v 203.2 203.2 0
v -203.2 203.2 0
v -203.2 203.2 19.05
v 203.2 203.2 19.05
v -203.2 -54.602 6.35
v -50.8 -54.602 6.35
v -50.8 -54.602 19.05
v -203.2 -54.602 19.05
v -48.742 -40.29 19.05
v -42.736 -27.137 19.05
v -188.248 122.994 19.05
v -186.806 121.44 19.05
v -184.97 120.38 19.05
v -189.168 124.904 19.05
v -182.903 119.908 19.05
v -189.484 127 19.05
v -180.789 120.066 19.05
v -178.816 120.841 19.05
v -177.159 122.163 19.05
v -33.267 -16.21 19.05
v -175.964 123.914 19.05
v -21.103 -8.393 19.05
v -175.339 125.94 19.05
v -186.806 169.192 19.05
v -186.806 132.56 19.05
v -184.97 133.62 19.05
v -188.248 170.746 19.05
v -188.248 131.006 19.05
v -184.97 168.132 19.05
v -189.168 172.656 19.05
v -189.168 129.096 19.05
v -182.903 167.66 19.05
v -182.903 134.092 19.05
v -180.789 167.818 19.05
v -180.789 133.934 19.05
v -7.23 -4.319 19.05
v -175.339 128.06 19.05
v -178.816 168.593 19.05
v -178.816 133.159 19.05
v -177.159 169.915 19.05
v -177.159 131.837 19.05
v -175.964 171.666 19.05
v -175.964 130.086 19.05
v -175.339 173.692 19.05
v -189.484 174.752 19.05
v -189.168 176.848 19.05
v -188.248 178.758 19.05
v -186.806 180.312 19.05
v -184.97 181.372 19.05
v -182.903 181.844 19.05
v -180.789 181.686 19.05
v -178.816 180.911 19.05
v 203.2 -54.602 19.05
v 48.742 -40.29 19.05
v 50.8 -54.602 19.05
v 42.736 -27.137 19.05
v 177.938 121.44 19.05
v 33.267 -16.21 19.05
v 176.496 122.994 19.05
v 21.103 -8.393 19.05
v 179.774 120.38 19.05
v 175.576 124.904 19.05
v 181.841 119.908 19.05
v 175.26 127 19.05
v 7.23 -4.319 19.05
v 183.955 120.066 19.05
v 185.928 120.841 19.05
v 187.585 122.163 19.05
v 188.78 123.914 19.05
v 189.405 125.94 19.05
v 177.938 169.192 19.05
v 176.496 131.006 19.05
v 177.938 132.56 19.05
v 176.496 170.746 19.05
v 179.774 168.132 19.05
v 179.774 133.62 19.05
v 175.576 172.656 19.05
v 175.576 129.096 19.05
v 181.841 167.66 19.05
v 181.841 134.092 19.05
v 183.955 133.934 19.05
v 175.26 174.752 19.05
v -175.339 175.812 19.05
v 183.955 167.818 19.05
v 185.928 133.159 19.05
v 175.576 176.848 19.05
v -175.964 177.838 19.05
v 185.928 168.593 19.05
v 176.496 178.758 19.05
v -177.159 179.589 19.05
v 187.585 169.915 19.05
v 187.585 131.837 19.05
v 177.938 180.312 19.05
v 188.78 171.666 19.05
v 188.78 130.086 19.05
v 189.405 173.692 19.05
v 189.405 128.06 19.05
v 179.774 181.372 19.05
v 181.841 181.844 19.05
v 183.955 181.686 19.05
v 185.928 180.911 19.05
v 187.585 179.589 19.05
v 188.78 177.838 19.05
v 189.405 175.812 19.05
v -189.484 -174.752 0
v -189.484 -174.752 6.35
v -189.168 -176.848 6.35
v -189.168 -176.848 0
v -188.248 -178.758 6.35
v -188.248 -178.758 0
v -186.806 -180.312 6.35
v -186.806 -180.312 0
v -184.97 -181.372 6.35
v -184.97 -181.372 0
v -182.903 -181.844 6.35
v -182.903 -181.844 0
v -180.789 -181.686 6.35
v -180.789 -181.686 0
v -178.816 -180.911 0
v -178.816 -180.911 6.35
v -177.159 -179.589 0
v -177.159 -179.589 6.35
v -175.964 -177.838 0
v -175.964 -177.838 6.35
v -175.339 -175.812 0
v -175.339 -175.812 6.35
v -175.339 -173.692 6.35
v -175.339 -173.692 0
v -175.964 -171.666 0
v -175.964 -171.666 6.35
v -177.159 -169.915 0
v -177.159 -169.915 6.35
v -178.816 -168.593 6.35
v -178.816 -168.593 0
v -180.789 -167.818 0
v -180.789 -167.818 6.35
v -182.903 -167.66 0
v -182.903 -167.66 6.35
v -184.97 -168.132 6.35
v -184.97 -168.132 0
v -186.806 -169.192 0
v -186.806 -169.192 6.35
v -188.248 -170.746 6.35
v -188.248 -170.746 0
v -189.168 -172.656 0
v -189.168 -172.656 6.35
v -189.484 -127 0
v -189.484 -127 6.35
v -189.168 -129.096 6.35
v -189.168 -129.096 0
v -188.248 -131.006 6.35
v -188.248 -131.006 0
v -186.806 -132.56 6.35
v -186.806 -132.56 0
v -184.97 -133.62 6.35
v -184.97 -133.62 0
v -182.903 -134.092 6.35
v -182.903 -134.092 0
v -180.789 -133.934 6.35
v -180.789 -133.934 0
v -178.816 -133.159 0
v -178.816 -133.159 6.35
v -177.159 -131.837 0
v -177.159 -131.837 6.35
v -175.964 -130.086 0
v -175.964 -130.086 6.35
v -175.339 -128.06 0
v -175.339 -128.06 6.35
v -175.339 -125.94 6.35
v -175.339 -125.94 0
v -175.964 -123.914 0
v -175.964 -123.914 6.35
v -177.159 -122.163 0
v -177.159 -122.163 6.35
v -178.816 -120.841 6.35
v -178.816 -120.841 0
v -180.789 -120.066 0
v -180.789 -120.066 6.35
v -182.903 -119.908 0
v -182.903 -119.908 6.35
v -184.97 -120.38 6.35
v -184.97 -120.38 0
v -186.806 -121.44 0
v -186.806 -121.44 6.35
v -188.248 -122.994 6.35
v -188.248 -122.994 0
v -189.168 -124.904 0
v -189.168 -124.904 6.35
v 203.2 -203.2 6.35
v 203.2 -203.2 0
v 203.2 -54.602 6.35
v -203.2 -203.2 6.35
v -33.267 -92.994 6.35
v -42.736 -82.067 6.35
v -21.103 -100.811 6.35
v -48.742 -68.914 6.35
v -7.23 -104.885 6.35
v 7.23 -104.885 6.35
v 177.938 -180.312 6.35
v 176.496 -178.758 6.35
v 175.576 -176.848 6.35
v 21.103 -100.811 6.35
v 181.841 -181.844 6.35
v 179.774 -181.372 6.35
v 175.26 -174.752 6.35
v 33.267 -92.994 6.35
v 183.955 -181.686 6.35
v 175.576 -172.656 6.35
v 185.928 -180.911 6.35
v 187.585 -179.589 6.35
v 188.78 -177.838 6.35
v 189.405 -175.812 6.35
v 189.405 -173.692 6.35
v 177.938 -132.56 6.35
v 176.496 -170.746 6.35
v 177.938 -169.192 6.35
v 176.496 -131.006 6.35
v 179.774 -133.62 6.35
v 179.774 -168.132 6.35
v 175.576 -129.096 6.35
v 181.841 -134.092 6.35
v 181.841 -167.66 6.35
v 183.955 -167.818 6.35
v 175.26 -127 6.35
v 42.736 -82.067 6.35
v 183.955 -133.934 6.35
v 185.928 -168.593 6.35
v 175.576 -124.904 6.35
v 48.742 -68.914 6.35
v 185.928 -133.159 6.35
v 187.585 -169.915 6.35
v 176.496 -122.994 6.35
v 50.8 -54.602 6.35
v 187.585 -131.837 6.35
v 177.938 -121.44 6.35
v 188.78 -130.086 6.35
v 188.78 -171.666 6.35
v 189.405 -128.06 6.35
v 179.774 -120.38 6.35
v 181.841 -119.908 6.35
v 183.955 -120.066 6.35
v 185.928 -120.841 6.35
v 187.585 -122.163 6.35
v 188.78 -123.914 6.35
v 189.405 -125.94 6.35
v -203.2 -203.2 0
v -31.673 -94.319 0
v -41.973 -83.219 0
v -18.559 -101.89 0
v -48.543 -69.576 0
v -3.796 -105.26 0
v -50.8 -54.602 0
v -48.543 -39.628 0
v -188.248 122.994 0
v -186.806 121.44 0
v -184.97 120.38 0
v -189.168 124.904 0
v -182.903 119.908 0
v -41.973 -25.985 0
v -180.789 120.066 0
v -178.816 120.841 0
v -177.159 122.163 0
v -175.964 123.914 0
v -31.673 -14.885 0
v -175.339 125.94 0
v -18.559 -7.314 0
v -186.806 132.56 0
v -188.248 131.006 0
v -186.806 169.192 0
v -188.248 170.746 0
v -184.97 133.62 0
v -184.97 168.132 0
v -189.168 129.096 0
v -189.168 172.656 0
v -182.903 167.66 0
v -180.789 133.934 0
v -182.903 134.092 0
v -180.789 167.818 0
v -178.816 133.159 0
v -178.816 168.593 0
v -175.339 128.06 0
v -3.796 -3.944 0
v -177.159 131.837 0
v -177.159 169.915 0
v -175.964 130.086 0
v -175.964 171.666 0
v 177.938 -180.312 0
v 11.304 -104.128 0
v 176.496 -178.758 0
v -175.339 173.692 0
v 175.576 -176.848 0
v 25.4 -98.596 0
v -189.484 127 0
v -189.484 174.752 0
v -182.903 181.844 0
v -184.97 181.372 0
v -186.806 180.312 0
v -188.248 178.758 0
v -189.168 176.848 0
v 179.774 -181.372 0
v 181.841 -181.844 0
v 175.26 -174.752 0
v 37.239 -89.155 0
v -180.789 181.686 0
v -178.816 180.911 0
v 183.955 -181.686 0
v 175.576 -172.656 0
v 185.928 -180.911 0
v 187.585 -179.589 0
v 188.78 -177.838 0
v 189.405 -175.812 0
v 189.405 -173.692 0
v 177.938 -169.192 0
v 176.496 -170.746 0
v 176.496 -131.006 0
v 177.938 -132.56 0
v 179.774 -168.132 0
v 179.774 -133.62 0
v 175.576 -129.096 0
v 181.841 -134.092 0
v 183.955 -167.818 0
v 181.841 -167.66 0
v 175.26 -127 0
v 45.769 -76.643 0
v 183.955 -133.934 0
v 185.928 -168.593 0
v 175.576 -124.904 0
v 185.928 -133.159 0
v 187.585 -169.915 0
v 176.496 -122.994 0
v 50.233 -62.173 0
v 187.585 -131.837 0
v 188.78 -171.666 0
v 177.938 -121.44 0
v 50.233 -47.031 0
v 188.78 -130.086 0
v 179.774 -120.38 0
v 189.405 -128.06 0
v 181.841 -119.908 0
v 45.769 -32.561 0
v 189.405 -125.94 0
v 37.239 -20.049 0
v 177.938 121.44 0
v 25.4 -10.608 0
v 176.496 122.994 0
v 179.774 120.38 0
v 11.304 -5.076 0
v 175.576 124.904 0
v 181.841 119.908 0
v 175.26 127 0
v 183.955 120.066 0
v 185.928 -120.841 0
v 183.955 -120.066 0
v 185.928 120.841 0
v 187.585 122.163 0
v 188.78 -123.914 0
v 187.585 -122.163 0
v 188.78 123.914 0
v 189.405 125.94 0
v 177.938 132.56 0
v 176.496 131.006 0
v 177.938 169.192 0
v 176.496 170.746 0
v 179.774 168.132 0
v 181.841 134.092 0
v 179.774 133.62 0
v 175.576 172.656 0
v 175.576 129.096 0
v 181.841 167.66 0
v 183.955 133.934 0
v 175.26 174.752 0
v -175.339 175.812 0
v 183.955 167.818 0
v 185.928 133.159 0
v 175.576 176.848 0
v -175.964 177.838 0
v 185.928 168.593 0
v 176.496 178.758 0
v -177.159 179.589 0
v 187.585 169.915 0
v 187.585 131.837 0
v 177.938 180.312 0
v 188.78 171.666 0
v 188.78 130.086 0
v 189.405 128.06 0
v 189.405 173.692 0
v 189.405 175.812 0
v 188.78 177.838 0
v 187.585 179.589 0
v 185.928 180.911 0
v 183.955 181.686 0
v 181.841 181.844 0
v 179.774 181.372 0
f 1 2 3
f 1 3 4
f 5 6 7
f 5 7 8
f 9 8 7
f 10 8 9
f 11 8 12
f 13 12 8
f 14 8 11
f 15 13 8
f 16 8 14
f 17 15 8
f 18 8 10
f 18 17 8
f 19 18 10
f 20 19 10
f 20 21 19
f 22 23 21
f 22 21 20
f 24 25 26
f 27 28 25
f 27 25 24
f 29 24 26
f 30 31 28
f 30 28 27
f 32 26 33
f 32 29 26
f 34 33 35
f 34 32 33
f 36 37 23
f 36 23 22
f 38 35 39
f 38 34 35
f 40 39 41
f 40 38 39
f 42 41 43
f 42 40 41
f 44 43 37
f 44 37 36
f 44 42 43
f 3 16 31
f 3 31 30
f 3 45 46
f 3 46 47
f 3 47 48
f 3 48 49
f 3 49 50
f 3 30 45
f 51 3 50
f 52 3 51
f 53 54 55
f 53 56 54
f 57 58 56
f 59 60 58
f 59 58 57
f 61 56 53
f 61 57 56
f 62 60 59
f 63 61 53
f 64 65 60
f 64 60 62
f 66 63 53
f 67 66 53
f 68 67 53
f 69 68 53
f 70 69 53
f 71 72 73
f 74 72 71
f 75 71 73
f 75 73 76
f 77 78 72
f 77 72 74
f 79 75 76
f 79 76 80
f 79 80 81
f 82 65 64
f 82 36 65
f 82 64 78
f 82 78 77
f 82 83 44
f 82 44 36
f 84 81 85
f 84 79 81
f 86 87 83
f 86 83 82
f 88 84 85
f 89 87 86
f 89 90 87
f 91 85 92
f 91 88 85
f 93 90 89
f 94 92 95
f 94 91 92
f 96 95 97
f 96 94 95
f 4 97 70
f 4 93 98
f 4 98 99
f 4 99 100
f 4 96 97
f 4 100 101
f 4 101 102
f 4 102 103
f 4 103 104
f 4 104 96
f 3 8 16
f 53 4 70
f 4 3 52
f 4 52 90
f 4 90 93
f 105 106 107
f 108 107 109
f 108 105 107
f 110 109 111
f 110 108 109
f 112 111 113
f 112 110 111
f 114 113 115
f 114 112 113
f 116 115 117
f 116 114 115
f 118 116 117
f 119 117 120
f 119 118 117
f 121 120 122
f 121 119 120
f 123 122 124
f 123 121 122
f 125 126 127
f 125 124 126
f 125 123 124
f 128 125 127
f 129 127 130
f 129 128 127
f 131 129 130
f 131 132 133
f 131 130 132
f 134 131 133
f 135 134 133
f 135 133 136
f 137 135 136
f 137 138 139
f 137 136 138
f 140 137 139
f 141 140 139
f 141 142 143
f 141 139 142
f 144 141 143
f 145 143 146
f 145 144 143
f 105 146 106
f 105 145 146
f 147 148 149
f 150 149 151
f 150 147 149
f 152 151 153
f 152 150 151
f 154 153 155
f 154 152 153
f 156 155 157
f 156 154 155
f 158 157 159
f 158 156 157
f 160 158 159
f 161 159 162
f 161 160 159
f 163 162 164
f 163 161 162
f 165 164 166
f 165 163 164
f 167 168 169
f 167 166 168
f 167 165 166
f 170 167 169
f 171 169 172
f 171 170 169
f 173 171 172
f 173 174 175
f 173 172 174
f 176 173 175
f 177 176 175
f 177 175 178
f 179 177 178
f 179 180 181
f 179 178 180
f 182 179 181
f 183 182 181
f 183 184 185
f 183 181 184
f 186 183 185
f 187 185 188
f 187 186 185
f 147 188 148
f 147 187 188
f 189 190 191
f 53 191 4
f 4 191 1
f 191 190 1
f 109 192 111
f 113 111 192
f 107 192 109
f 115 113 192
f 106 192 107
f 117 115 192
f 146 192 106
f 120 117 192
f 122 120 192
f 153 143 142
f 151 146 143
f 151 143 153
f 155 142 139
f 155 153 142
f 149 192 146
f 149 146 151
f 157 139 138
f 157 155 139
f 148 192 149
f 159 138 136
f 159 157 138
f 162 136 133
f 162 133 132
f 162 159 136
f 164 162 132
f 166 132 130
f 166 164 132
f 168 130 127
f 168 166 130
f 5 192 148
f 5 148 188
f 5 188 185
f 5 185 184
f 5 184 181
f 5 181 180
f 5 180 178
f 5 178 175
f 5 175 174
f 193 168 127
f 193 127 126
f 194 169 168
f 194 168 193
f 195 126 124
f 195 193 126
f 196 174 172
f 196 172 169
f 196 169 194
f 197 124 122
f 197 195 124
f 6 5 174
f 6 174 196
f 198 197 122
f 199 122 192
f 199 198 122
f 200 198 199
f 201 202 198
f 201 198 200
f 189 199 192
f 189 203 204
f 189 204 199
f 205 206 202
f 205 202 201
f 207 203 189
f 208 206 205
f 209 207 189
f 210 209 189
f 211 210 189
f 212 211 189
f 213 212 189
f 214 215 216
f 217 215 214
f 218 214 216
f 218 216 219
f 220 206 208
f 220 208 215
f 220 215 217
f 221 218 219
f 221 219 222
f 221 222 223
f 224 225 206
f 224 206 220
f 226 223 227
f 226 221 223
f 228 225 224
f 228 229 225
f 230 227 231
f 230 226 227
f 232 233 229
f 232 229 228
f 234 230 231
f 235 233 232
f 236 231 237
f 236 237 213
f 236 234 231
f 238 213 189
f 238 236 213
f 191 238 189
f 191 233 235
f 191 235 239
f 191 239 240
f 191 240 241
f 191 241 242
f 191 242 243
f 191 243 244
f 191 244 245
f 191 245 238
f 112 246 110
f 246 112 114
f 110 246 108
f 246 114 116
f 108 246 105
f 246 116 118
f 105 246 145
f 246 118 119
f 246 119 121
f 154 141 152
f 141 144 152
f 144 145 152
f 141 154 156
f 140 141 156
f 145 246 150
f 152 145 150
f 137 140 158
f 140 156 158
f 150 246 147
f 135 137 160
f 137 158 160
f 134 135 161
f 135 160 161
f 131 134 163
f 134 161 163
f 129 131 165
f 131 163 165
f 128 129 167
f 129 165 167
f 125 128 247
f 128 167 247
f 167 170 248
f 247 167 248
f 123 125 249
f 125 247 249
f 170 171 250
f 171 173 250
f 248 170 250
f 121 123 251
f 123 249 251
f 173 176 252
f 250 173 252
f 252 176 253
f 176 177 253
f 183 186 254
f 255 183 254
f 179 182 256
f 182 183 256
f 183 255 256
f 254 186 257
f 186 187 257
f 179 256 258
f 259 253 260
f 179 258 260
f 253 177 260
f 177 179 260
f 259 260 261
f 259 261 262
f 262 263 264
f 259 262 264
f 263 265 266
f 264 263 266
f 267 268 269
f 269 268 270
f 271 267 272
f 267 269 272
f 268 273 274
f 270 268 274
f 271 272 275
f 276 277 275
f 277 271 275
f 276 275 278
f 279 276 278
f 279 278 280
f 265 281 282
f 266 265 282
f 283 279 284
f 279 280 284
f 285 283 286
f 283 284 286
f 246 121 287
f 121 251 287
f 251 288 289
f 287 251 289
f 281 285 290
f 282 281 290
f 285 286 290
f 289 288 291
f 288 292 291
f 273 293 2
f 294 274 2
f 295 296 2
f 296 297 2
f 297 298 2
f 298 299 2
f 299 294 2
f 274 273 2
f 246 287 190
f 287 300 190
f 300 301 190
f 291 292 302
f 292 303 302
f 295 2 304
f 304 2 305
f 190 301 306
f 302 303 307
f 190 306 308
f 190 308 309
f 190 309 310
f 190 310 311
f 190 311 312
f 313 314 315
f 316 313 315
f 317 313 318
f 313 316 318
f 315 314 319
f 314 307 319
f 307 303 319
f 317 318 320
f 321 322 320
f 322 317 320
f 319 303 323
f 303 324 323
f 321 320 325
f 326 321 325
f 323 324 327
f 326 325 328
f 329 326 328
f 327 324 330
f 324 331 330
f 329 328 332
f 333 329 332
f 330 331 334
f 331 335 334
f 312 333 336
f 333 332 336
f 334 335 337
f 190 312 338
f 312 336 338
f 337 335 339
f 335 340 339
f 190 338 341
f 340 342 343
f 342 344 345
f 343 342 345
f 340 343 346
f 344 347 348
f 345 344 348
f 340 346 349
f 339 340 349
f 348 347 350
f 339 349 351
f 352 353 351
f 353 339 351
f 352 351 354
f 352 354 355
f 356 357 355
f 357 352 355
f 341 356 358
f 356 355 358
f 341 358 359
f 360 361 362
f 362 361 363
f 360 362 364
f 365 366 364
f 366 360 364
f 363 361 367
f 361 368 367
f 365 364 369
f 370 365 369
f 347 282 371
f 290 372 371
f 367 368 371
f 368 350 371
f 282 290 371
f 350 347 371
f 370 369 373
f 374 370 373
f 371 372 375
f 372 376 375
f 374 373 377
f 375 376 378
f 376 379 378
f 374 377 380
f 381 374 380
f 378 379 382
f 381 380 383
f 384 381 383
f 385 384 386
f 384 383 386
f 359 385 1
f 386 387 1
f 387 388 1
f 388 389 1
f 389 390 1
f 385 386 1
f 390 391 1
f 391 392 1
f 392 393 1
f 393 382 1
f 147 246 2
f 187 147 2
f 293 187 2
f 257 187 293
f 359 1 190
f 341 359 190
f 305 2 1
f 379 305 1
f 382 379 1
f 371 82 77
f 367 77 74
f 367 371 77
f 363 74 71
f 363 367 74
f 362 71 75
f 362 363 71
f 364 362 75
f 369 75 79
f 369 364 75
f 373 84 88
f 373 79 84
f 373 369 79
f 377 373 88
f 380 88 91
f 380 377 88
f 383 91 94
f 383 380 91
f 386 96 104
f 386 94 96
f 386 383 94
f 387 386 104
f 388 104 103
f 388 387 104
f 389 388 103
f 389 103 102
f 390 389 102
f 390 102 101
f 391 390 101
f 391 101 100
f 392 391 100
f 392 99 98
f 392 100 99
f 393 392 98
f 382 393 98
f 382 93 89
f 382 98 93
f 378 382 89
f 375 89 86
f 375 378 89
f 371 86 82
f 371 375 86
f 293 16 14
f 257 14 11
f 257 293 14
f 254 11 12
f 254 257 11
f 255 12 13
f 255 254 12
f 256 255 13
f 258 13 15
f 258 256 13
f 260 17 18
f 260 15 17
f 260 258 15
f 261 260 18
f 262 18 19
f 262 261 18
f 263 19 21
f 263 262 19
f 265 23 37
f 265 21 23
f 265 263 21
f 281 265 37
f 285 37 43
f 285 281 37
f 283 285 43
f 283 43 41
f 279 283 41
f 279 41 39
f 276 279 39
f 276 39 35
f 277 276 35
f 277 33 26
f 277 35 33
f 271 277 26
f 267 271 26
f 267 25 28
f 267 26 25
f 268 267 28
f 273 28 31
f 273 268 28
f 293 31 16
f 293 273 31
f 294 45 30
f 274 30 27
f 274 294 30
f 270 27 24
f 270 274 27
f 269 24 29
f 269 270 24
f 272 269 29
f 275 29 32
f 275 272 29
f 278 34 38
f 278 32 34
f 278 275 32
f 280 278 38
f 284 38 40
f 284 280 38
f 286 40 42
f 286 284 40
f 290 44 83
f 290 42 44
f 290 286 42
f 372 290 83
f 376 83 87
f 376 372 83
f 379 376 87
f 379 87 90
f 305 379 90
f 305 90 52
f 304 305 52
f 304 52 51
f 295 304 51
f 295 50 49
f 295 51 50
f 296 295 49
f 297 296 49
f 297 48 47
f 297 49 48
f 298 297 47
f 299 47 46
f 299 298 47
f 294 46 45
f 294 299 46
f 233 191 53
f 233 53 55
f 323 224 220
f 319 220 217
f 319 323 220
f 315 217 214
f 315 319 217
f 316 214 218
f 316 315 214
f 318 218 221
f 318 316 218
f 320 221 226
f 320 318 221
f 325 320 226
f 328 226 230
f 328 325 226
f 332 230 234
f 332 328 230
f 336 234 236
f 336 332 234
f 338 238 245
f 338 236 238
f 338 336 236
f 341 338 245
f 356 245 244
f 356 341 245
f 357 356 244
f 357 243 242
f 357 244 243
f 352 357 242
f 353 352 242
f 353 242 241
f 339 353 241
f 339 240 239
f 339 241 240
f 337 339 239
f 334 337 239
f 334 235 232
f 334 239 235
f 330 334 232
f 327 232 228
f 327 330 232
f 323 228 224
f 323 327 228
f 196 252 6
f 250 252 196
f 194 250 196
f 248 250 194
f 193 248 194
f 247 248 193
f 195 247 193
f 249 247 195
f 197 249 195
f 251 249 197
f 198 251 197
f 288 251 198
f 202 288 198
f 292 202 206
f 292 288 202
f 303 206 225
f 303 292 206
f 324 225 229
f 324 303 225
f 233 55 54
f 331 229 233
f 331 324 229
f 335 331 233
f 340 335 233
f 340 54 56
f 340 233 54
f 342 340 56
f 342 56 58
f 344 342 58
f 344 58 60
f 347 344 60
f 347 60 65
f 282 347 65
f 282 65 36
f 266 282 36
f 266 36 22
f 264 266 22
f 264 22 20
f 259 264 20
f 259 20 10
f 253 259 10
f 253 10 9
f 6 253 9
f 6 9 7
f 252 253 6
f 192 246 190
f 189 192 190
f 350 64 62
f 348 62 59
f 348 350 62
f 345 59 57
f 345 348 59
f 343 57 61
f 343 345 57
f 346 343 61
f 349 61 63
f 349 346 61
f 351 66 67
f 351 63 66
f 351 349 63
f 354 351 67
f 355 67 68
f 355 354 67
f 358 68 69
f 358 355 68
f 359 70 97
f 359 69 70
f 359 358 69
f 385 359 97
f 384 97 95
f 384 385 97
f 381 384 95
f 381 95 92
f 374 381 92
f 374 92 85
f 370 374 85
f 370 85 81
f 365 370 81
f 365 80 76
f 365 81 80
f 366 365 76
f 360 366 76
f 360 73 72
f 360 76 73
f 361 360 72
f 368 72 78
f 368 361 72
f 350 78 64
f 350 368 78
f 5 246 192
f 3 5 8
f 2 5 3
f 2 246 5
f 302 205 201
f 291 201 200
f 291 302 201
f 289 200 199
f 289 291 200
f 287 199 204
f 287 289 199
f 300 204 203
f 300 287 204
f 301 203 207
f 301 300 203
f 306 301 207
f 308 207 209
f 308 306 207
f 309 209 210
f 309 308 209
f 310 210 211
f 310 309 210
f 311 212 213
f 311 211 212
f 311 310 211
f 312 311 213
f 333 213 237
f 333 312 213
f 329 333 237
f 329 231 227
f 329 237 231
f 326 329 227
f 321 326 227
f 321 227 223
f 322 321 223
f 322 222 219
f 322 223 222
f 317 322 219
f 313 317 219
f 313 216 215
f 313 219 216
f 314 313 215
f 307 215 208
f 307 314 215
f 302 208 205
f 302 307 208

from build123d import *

# Parameters (mm, degrees)
SKETCH_1_W          = 406.4
SKETCH_1_H          = 406.4
SKETCH_1_R          = 50.8
EXTRUDE_1_DEPTH     = 19.05
CUT_EXTRUDE_START   = -12.7
CUT_EXTRUDE_1_DEPTH = 12.7
SKETCH_4_R          = 7.112
CUT_EXTRUDE_4_DEPTH = 288.998927949


with BuildPart() as part:
    # 草图1 → 凸台-拉伸1 (new body)
    with BuildSketch(Plane.XY):
        Rectangle(SKETCH_1_W, SKETCH_1_H)
        with Locations(Location((0, -54.602000016, 0), (0, 0, 180))):
            Circle(SKETCH_1_R, mode=Mode.SUBTRACT)
    extrude(amount=EXTRUDE_1_DEPTH)

    # 草图3 → 切除-拉伸1 (cut)
    with BuildSketch(Plane.XY.offset(19.05).offset(CUT_EXTRUDE_START)):
        with BuildLine():
            Line((-50.8, -54.602000016), (-203.2, -54.602000016))
            Line((-203.2, -54.602000016), (-203.2, -203.2))
            Line((-203.2, -203.2), (203.2, -203.2))
            Line((203.2, -203.2), (203.2, -54.602000016))
            Line((203.2, -54.602000016), (50.8, -54.602000016))
            ThreePointArc((50.8, -54.602000016), (0, -105.402000016), (-50.8, -54.602000016))
        make_face()
    extrude(amount=CUT_EXTRUDE_1_DEPTH, mode=Mode.SUBTRACT)

    # 草图4 → 切除-拉伸4 (cut, through all)
    with BuildSketch(Plane.XY):
        with Locations(Location((-182.372, 174.752, 0), (0, 0, 180))):
            Circle(SKETCH_4_R)
        with Locations(Location((-182.372, 127, 0), (0, 0, 180))):
            Circle(SKETCH_4_R)
        with Locations(Location((182.372, 127, 0), (0, 0, 180))):
            Circle(SKETCH_4_R)
        with Locations(Location((182.372, 174.752, 0), (0, 0, 180))):
            Circle(SKETCH_4_R)
        with Locations(Location((182.372, -174.752, 0), (0, 0, 180))):
            Circle(SKETCH_4_R)
        with Locations(Location((182.372, -127, 0), (0, 0, 180))):
            Circle(SKETCH_4_R)
        with Locations(Location((-182.372, -174.752, 0), (0, 0, 180))):
            Circle(SKETCH_4_R)
        with Locations(Location((-182.372, -127, 0), (0, 0, 180))):
            Circle(SKETCH_4_R)
    extrude(amount=CUT_EXTRUDE_4_DEPTH, mode=Mode.SUBTRACT)


solid = part.part
